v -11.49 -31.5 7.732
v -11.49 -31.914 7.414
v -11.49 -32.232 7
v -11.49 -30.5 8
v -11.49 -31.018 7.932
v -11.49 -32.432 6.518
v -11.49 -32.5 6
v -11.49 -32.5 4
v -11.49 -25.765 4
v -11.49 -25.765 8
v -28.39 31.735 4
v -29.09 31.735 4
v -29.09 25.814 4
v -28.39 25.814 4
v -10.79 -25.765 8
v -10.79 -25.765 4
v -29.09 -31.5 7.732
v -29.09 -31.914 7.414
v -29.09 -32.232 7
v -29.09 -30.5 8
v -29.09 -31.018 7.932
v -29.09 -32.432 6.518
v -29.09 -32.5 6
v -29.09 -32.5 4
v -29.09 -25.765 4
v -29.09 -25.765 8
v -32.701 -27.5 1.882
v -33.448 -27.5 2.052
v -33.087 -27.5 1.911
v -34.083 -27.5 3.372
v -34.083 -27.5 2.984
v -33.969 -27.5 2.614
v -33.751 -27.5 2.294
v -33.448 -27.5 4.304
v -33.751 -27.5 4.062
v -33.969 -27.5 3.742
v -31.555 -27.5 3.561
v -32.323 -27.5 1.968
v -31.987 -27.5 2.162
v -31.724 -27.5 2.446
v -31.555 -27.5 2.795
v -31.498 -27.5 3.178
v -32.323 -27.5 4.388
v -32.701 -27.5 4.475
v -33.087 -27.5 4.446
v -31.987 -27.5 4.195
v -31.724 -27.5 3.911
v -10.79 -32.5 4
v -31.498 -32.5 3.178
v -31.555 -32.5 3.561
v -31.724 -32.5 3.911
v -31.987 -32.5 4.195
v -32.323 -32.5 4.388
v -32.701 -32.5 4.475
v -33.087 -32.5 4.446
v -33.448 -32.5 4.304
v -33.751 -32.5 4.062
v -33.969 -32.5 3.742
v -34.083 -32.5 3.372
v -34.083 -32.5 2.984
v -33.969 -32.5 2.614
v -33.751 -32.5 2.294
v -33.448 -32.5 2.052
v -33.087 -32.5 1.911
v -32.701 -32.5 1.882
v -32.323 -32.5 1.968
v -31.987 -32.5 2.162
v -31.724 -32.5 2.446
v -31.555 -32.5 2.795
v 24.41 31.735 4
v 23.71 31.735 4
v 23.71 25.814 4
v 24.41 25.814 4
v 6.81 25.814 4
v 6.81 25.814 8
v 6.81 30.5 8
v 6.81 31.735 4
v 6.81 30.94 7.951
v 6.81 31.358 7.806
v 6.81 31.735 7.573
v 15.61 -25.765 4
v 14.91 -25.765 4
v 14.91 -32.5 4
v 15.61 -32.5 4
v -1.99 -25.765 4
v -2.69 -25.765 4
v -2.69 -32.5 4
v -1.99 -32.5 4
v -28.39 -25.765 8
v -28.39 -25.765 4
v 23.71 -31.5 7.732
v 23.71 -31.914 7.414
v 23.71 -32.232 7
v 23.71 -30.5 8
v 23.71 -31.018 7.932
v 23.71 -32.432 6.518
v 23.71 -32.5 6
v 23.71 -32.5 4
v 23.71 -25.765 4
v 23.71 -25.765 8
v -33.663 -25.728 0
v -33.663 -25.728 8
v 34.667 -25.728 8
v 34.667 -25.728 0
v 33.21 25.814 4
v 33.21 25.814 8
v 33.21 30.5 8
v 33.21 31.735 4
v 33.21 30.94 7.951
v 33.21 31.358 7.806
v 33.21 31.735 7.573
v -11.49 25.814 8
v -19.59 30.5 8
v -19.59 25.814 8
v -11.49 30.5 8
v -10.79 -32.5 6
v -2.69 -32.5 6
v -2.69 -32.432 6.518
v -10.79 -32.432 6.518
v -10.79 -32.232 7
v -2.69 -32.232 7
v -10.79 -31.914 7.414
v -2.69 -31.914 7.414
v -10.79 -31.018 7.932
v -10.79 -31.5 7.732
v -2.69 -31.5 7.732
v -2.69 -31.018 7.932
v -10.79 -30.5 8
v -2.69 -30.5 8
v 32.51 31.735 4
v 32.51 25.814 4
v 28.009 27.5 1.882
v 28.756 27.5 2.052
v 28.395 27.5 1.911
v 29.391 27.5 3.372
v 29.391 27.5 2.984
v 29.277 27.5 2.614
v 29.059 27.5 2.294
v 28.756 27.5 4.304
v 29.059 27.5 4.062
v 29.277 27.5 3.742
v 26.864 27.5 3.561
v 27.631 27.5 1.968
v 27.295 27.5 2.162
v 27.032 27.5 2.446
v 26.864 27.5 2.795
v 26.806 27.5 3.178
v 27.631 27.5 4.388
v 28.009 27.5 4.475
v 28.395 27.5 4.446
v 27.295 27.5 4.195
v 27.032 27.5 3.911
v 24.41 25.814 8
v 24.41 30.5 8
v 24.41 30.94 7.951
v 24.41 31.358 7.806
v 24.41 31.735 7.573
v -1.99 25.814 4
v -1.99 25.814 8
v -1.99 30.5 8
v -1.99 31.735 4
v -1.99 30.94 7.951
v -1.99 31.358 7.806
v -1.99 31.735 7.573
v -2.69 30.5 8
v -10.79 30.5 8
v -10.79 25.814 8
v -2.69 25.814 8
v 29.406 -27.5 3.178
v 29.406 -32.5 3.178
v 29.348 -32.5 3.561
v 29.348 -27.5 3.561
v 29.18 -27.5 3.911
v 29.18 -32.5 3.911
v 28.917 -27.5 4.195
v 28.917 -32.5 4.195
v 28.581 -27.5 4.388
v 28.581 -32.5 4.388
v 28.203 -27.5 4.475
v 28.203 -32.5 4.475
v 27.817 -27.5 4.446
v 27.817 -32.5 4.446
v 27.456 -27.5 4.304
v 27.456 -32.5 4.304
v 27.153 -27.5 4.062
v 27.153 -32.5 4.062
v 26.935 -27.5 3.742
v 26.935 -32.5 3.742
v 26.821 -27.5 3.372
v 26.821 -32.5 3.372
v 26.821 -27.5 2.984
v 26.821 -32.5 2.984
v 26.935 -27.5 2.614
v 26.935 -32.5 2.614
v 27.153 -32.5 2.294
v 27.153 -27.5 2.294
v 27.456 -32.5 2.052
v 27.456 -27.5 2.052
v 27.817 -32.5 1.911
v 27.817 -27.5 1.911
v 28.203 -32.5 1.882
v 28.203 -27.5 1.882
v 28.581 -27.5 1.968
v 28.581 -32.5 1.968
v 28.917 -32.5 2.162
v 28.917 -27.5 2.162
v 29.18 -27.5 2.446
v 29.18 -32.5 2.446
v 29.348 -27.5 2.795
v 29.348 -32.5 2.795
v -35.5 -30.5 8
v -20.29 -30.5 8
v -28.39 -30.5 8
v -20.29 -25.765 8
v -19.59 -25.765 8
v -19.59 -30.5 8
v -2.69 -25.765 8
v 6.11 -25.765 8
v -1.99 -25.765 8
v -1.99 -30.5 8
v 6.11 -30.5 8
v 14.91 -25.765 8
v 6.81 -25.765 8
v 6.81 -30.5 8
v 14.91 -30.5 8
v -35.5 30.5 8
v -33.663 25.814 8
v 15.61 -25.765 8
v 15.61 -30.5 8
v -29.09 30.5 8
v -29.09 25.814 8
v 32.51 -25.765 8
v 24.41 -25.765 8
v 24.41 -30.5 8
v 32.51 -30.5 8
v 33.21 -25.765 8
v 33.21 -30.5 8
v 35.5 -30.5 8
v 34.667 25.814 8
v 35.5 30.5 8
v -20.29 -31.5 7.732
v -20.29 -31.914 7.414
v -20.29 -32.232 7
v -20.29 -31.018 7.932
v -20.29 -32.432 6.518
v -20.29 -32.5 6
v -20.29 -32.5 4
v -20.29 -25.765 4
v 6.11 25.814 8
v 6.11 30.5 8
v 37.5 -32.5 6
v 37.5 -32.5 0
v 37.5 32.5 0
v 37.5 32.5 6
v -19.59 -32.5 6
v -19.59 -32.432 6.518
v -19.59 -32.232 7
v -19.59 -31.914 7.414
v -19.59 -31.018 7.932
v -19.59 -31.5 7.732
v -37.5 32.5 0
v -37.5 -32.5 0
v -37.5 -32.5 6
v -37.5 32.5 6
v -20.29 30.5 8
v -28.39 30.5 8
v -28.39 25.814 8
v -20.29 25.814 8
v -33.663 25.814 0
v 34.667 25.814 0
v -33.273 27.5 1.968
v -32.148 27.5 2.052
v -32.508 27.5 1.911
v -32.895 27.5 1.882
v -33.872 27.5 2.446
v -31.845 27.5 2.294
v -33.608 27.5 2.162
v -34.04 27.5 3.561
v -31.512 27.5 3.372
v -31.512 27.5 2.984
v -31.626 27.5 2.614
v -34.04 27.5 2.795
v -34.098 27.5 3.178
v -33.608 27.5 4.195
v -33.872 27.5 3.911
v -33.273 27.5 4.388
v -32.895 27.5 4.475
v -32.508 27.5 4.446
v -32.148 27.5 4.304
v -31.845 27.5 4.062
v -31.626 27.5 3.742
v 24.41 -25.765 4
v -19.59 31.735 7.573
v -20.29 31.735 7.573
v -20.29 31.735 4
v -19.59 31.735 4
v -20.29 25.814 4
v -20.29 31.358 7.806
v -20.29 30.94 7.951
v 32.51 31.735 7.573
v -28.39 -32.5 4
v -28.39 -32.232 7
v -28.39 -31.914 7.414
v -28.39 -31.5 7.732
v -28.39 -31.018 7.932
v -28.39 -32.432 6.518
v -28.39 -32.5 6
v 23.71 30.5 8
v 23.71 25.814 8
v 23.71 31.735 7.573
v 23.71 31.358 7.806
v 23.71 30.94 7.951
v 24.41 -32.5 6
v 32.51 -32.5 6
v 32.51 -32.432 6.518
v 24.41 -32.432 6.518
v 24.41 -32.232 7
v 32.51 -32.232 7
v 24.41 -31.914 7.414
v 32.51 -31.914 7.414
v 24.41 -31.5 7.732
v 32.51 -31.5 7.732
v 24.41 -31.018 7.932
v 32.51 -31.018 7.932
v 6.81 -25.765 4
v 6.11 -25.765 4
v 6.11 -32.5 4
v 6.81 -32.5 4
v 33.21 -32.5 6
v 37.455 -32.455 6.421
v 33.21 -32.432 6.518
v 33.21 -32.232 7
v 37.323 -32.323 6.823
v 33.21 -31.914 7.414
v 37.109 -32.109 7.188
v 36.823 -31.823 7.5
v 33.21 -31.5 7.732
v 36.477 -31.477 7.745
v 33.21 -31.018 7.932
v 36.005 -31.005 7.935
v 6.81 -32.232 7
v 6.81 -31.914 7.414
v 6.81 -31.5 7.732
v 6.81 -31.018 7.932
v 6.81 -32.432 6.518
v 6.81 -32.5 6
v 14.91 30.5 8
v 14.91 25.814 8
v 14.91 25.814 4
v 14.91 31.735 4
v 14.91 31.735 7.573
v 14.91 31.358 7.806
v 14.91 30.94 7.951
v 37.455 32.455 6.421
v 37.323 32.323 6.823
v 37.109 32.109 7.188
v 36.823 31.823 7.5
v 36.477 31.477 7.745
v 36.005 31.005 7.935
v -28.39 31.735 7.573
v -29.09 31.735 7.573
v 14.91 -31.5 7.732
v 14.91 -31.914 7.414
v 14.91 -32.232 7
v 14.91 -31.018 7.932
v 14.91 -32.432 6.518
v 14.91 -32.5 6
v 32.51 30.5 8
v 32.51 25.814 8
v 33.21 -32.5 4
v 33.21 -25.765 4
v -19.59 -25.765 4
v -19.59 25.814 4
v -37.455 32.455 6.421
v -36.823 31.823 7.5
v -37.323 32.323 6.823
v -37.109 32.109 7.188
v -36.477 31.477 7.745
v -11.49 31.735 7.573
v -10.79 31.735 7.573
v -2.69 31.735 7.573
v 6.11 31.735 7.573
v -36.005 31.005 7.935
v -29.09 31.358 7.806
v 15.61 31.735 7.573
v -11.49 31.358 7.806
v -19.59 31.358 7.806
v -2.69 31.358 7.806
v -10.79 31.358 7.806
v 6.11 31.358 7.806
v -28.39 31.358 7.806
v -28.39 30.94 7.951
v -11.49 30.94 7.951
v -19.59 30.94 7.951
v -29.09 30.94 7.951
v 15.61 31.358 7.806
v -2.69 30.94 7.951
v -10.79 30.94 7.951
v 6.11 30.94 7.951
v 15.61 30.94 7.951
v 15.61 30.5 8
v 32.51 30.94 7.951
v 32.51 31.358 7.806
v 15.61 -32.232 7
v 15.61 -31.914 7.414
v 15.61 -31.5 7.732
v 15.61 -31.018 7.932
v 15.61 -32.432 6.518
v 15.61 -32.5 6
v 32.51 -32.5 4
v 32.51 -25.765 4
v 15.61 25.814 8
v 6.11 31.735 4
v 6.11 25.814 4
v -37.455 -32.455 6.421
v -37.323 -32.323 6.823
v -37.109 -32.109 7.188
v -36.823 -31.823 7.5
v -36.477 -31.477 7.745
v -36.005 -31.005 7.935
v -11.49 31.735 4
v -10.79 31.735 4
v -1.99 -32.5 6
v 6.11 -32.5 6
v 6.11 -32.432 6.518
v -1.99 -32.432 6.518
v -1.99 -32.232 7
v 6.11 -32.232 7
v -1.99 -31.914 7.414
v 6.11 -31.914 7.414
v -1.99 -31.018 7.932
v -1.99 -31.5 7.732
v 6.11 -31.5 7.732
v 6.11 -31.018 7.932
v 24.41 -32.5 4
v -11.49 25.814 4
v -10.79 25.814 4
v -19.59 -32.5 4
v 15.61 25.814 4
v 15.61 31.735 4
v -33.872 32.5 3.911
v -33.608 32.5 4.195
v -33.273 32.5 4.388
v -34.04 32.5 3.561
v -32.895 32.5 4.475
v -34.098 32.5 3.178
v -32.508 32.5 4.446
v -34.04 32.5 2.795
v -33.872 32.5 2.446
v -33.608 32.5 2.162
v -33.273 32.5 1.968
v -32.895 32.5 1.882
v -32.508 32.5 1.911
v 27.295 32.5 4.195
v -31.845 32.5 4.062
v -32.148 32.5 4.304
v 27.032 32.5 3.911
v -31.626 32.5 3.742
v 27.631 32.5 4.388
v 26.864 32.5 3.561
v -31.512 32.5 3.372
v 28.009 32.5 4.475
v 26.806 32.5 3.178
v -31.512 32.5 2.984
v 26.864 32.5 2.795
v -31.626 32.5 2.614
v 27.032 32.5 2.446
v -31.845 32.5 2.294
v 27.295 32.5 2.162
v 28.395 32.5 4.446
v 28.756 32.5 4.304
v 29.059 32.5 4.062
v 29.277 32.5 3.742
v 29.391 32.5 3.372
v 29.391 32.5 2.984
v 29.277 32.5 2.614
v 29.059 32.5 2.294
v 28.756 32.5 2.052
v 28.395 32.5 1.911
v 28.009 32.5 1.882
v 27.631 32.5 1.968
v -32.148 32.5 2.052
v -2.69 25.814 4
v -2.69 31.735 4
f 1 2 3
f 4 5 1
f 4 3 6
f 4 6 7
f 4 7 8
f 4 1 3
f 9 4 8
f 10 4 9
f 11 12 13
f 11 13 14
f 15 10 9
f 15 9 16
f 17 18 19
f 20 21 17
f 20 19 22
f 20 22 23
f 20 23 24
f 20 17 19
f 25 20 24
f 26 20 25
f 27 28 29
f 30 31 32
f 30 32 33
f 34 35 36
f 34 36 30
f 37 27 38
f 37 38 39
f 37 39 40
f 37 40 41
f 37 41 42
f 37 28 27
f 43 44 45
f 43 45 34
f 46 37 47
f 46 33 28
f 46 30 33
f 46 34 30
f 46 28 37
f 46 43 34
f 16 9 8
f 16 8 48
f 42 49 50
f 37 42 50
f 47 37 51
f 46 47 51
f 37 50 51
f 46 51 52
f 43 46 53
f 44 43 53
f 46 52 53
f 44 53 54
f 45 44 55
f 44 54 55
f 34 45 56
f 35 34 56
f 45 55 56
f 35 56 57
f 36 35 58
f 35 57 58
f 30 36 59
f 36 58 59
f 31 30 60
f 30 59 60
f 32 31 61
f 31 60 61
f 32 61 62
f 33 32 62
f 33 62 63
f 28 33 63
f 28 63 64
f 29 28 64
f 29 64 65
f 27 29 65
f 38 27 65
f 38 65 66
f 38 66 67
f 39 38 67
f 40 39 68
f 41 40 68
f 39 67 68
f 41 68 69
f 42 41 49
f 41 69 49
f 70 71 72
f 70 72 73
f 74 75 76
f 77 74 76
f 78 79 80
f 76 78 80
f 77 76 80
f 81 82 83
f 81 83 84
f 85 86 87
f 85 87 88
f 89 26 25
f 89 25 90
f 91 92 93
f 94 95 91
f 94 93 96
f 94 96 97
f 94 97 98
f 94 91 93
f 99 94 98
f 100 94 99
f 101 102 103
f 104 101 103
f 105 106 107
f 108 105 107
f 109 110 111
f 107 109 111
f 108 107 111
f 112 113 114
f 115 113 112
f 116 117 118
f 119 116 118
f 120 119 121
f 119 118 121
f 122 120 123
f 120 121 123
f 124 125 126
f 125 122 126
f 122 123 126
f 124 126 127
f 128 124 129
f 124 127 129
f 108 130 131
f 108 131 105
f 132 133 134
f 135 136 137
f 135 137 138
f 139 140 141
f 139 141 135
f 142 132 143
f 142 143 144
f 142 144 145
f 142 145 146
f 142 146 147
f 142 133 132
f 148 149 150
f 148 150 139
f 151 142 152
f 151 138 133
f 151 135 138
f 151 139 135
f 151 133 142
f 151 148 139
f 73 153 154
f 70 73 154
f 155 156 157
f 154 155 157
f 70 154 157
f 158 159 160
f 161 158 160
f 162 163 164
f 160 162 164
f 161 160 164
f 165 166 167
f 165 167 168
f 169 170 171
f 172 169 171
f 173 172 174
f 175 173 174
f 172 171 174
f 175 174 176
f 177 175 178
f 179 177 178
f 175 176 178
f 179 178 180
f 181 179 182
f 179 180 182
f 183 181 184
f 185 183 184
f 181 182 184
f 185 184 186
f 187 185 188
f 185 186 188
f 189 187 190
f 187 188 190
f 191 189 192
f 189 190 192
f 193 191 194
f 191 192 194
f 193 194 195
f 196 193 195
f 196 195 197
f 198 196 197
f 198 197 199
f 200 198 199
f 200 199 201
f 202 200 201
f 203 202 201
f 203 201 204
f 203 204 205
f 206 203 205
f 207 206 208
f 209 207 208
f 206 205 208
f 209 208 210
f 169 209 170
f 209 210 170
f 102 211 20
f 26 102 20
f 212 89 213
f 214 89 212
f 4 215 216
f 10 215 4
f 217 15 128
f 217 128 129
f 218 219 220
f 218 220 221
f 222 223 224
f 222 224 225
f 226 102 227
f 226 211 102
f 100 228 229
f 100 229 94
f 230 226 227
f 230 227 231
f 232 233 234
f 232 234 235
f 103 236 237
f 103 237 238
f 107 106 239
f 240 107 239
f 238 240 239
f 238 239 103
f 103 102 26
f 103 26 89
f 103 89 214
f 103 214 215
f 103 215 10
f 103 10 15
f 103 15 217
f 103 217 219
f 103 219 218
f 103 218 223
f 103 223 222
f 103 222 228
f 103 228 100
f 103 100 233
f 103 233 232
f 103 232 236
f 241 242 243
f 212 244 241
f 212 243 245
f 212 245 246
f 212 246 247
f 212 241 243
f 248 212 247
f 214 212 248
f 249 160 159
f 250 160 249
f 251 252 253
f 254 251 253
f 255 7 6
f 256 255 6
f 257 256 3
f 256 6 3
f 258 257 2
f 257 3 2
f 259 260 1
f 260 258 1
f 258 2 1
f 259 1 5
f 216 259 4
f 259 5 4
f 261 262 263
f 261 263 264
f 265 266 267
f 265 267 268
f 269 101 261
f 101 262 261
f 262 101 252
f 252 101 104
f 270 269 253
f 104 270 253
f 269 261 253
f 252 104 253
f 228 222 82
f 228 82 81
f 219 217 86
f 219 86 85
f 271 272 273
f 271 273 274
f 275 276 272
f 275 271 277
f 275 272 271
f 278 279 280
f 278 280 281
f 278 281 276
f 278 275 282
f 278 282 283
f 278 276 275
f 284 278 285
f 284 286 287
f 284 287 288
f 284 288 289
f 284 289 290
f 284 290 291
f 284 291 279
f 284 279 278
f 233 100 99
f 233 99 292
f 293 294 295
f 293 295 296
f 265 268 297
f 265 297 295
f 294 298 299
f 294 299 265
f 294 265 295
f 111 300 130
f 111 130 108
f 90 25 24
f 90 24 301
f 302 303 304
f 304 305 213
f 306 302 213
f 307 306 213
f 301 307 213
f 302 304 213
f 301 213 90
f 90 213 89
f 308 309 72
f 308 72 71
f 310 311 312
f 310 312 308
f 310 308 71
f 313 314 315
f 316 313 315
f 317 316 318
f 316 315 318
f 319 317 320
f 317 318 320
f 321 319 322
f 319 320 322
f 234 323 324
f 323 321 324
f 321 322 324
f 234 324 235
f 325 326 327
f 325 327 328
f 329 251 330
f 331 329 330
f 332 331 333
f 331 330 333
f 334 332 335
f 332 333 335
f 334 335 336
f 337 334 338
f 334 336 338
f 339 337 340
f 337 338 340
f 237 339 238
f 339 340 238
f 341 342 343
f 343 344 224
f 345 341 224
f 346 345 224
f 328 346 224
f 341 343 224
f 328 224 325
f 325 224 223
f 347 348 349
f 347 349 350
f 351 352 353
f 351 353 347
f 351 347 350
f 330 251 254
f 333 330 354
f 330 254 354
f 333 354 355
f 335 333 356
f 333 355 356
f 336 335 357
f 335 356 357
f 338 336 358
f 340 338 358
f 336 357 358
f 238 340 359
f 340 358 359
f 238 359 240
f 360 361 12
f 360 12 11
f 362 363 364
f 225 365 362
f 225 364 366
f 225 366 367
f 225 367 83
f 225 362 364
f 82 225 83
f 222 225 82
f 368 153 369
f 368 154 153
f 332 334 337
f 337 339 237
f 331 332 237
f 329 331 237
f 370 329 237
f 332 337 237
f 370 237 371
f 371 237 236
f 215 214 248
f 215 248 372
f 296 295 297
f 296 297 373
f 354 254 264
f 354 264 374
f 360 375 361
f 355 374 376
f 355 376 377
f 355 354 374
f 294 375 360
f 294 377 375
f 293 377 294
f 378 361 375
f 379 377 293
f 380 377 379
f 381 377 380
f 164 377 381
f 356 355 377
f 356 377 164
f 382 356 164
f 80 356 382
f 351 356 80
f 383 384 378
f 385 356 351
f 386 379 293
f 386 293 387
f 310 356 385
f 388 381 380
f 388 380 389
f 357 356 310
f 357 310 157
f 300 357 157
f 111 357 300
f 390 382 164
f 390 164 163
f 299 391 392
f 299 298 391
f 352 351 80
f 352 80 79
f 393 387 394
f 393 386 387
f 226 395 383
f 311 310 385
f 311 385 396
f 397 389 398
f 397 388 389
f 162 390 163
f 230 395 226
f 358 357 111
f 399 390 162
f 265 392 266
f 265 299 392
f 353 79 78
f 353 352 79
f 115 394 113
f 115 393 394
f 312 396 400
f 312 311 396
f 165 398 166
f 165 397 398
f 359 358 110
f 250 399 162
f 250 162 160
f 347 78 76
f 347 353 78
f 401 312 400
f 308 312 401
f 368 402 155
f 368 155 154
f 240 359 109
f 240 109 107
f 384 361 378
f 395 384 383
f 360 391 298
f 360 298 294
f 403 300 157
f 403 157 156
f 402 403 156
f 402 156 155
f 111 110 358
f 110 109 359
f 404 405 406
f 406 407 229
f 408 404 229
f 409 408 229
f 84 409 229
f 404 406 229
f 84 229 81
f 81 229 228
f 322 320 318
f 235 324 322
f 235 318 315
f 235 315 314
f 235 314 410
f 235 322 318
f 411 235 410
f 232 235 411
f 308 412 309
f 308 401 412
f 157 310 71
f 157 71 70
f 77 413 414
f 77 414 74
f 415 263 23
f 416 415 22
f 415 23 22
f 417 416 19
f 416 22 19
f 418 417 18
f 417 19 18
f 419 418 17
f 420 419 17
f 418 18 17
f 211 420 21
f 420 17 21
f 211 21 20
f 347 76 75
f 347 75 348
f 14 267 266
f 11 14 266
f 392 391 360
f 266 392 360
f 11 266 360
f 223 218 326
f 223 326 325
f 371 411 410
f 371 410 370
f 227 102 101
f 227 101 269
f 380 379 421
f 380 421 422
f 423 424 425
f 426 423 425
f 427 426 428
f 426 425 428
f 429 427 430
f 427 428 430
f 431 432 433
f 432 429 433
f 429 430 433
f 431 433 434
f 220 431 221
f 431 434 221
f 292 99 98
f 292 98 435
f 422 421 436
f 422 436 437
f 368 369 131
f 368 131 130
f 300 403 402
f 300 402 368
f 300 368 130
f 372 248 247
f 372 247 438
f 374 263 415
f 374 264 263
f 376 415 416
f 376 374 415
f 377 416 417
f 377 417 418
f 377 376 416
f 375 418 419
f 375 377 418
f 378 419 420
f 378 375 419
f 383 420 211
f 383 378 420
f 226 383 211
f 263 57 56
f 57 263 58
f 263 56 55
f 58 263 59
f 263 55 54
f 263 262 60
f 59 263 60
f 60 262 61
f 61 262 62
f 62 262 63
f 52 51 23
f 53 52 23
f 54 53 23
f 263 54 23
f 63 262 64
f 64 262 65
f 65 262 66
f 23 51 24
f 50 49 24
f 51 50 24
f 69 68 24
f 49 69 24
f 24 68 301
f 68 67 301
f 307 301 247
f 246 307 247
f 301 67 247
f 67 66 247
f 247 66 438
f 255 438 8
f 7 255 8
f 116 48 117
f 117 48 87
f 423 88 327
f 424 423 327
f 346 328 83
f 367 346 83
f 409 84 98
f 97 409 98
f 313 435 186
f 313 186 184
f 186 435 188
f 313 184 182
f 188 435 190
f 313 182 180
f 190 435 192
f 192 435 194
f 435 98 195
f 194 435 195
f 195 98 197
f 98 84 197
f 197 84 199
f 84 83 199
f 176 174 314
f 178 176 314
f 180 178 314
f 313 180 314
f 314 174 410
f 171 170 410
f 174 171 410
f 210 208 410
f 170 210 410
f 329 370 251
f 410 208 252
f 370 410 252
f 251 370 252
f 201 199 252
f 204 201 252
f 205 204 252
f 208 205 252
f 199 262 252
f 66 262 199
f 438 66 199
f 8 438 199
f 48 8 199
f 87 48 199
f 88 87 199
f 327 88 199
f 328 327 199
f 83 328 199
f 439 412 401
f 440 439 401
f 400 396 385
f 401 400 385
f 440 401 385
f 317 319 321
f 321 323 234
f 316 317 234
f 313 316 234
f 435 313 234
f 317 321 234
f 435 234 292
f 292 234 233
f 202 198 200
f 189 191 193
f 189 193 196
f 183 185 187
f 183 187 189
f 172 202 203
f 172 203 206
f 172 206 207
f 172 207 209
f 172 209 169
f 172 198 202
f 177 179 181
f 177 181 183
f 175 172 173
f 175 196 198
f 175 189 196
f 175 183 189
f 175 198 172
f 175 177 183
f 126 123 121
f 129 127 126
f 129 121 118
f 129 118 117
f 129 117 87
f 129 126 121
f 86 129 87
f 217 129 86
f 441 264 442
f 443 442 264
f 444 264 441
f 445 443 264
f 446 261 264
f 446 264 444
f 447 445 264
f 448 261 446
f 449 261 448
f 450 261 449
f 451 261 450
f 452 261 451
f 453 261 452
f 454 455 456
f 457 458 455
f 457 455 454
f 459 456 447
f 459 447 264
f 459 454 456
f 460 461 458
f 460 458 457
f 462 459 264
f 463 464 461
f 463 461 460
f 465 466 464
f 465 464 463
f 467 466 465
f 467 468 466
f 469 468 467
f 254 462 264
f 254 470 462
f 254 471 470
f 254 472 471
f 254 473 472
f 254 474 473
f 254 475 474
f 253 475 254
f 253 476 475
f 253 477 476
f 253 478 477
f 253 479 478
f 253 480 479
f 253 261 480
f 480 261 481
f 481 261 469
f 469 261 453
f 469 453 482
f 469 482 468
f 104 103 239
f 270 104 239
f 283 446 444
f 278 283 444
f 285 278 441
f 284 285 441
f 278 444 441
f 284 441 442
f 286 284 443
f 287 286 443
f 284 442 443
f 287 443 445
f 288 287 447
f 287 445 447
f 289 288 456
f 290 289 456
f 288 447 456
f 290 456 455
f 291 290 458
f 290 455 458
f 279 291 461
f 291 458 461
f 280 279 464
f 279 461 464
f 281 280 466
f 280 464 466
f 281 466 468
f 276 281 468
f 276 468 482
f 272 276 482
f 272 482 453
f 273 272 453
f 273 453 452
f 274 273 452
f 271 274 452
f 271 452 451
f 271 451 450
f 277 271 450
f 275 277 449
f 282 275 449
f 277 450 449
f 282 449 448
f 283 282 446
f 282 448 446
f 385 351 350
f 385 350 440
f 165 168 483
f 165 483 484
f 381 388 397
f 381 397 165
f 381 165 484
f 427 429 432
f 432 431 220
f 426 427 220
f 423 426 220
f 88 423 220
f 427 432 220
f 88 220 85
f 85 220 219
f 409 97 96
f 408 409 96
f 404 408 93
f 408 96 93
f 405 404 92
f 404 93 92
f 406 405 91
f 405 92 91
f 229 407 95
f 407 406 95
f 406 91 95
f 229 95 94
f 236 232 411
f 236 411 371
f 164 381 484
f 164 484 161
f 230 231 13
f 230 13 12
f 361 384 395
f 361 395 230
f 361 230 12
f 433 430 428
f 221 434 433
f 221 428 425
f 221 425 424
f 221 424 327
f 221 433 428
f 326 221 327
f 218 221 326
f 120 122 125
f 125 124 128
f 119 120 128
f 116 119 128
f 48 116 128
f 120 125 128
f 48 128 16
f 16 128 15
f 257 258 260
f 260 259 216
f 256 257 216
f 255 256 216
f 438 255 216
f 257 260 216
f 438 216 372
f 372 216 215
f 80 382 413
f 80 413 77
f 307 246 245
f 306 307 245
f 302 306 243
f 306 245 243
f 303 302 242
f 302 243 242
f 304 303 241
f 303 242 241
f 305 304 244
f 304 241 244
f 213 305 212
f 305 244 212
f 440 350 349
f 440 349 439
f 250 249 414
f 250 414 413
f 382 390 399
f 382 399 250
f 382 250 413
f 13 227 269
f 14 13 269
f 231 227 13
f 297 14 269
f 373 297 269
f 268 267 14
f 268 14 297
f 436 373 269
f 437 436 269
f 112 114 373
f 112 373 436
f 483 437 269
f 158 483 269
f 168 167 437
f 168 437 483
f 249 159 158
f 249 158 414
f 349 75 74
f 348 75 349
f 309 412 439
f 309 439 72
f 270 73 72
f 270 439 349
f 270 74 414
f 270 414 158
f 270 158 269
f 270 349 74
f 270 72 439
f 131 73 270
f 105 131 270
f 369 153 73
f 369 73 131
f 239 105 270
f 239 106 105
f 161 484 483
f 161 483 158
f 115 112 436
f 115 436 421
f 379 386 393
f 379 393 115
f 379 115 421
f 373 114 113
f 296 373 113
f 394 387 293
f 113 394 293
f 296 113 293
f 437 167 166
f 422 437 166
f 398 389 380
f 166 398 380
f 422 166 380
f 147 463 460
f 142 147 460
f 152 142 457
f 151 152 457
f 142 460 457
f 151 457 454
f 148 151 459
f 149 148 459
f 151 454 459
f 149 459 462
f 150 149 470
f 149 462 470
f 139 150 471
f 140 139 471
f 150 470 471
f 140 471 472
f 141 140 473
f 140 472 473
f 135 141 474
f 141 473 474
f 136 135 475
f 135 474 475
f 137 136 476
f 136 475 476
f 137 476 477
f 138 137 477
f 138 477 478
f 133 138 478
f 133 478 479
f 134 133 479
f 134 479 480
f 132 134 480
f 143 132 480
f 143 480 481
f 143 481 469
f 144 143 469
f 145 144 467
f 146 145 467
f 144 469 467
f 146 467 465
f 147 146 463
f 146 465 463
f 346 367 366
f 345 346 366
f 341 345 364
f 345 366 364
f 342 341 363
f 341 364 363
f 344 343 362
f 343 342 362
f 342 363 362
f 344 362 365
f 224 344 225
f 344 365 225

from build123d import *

# Parameters (mm, degrees)
F0_W      = 75
F0_H      = 65
F1_DEPTH  = 8
F2_R      = 2
F3_W      = 68.330624
F3_H      = 51.542157
F4_DEPTH  = 8.001
F5_W      = 0.7
F5_H      = 7.5
F6_DEPTH  = 4
F7_R      = 1.3
F9_DEPTH  = 5
F8_R      = 1.3
F10_DEPTH = 5


with BuildPart() as f1:
    # F0 (on Top) → F1 (new body)
    with BuildSketch(Plane.XY):
        Rectangle(F0_W, F0_H)
    extrude(amount=F1_DEPTH)

    # F2
    f2_edges = [f1.edges().sort_by_distance(p)[0] for p in [
        (0, -32.5, 8),
        (37.5, 0, 8),
        (0, 32.5, 8),
        (-37.5, 0, 8),
    ]]
    fillet(f2_edges, radius=F2_R)

    # F3 (on face) → F4 (cut, through all)
    with BuildSketch(Plane.XY.offset(8)):
        with Locations((0.502158, 0.043064)):
            Rectangle(F3_W, F3_H)
    extrude(amount=-F4_DEPTH, mode=Mode.SUBTRACT)

    # F5 (on face) → F6 (cut)
    with BuildSketch(Plane.XY.offset(8)):
        with Locations((-28.739675, 27.984681)):
            Rectangle(F5_W, F5_H)
        with Locations((-28.739675, -29.515319)):
            Rectangle(F5_W, F5_H)
        with Locations((-19.939675, 27.984681)):
            Rectangle(F5_W, F5_H)
        with Locations((-19.939675, -29.515319)):
            Rectangle(F5_W, F5_H)
        with Locations((-11.139675, 27.984681)):
            Rectangle(F5_W, F5_H)
        with Locations((-11.139675, -29.515319)):
            Rectangle(F5_W, F5_H)
        with Locations((-2.339675, 27.984681)):
            Rectangle(F5_W, F5_H)
        with Locations((-2.339675, -29.515319)):
            Rectangle(F5_W, F5_H)
        with Locations((6.460325, 27.984681)):
            Rectangle(F5_W, F5_H)
        with Locations((6.460325, -29.515319)):
            Rectangle(F5_W, F5_H)
        with Locations((15.260325, 27.984681)):
            Rectangle(F5_W, F5_H)
        with Locations((15.260325, -29.515319)):
            Rectangle(F5_W, F5_H)
        with Locations((24.060325, 27.984681)):
            Rectangle(F5_W, F5_H)
        with Locations((24.060325, -29.515319)):
            Rectangle(F5_W, F5_H)
        with Locations((32.860325, 27.984681)):
            Rectangle(F5_W, F5_H)
        with Locations((32.860325, -29.515319)):
            Rectangle(F5_W, F5_H)
    extrude(amount=-F6_DEPTH, mode=Mode.SUBTRACT)

    # F7 (on face) → F9 (cut)
    with BuildSketch(Plane.XZ.offset(32.5)):
        with Locations((-32.797666, 3.178249)):
            Circle(F7_R)
        with Locations((28.105985, 3.178249)):
            Circle(F7_R)
    extrude(amount=-F9_DEPTH, mode=Mode.SUBTRACT)

    # F8 (on face) → F10 (cut)
    with BuildSketch(Plane(origin=(0, 32.5, 0), x_dir=(-1, 0, 0), z_dir=(0, 1, 0))):
        with Locations((32.797666, 3.178249)):
            Circle(F8_R)
        with Locations((-28.105985, 3.178249)):
            Circle(F8_R)
    extrude(amount=-F10_DEPTH, mode=Mode.SUBTRACT)


solid = f1.part
